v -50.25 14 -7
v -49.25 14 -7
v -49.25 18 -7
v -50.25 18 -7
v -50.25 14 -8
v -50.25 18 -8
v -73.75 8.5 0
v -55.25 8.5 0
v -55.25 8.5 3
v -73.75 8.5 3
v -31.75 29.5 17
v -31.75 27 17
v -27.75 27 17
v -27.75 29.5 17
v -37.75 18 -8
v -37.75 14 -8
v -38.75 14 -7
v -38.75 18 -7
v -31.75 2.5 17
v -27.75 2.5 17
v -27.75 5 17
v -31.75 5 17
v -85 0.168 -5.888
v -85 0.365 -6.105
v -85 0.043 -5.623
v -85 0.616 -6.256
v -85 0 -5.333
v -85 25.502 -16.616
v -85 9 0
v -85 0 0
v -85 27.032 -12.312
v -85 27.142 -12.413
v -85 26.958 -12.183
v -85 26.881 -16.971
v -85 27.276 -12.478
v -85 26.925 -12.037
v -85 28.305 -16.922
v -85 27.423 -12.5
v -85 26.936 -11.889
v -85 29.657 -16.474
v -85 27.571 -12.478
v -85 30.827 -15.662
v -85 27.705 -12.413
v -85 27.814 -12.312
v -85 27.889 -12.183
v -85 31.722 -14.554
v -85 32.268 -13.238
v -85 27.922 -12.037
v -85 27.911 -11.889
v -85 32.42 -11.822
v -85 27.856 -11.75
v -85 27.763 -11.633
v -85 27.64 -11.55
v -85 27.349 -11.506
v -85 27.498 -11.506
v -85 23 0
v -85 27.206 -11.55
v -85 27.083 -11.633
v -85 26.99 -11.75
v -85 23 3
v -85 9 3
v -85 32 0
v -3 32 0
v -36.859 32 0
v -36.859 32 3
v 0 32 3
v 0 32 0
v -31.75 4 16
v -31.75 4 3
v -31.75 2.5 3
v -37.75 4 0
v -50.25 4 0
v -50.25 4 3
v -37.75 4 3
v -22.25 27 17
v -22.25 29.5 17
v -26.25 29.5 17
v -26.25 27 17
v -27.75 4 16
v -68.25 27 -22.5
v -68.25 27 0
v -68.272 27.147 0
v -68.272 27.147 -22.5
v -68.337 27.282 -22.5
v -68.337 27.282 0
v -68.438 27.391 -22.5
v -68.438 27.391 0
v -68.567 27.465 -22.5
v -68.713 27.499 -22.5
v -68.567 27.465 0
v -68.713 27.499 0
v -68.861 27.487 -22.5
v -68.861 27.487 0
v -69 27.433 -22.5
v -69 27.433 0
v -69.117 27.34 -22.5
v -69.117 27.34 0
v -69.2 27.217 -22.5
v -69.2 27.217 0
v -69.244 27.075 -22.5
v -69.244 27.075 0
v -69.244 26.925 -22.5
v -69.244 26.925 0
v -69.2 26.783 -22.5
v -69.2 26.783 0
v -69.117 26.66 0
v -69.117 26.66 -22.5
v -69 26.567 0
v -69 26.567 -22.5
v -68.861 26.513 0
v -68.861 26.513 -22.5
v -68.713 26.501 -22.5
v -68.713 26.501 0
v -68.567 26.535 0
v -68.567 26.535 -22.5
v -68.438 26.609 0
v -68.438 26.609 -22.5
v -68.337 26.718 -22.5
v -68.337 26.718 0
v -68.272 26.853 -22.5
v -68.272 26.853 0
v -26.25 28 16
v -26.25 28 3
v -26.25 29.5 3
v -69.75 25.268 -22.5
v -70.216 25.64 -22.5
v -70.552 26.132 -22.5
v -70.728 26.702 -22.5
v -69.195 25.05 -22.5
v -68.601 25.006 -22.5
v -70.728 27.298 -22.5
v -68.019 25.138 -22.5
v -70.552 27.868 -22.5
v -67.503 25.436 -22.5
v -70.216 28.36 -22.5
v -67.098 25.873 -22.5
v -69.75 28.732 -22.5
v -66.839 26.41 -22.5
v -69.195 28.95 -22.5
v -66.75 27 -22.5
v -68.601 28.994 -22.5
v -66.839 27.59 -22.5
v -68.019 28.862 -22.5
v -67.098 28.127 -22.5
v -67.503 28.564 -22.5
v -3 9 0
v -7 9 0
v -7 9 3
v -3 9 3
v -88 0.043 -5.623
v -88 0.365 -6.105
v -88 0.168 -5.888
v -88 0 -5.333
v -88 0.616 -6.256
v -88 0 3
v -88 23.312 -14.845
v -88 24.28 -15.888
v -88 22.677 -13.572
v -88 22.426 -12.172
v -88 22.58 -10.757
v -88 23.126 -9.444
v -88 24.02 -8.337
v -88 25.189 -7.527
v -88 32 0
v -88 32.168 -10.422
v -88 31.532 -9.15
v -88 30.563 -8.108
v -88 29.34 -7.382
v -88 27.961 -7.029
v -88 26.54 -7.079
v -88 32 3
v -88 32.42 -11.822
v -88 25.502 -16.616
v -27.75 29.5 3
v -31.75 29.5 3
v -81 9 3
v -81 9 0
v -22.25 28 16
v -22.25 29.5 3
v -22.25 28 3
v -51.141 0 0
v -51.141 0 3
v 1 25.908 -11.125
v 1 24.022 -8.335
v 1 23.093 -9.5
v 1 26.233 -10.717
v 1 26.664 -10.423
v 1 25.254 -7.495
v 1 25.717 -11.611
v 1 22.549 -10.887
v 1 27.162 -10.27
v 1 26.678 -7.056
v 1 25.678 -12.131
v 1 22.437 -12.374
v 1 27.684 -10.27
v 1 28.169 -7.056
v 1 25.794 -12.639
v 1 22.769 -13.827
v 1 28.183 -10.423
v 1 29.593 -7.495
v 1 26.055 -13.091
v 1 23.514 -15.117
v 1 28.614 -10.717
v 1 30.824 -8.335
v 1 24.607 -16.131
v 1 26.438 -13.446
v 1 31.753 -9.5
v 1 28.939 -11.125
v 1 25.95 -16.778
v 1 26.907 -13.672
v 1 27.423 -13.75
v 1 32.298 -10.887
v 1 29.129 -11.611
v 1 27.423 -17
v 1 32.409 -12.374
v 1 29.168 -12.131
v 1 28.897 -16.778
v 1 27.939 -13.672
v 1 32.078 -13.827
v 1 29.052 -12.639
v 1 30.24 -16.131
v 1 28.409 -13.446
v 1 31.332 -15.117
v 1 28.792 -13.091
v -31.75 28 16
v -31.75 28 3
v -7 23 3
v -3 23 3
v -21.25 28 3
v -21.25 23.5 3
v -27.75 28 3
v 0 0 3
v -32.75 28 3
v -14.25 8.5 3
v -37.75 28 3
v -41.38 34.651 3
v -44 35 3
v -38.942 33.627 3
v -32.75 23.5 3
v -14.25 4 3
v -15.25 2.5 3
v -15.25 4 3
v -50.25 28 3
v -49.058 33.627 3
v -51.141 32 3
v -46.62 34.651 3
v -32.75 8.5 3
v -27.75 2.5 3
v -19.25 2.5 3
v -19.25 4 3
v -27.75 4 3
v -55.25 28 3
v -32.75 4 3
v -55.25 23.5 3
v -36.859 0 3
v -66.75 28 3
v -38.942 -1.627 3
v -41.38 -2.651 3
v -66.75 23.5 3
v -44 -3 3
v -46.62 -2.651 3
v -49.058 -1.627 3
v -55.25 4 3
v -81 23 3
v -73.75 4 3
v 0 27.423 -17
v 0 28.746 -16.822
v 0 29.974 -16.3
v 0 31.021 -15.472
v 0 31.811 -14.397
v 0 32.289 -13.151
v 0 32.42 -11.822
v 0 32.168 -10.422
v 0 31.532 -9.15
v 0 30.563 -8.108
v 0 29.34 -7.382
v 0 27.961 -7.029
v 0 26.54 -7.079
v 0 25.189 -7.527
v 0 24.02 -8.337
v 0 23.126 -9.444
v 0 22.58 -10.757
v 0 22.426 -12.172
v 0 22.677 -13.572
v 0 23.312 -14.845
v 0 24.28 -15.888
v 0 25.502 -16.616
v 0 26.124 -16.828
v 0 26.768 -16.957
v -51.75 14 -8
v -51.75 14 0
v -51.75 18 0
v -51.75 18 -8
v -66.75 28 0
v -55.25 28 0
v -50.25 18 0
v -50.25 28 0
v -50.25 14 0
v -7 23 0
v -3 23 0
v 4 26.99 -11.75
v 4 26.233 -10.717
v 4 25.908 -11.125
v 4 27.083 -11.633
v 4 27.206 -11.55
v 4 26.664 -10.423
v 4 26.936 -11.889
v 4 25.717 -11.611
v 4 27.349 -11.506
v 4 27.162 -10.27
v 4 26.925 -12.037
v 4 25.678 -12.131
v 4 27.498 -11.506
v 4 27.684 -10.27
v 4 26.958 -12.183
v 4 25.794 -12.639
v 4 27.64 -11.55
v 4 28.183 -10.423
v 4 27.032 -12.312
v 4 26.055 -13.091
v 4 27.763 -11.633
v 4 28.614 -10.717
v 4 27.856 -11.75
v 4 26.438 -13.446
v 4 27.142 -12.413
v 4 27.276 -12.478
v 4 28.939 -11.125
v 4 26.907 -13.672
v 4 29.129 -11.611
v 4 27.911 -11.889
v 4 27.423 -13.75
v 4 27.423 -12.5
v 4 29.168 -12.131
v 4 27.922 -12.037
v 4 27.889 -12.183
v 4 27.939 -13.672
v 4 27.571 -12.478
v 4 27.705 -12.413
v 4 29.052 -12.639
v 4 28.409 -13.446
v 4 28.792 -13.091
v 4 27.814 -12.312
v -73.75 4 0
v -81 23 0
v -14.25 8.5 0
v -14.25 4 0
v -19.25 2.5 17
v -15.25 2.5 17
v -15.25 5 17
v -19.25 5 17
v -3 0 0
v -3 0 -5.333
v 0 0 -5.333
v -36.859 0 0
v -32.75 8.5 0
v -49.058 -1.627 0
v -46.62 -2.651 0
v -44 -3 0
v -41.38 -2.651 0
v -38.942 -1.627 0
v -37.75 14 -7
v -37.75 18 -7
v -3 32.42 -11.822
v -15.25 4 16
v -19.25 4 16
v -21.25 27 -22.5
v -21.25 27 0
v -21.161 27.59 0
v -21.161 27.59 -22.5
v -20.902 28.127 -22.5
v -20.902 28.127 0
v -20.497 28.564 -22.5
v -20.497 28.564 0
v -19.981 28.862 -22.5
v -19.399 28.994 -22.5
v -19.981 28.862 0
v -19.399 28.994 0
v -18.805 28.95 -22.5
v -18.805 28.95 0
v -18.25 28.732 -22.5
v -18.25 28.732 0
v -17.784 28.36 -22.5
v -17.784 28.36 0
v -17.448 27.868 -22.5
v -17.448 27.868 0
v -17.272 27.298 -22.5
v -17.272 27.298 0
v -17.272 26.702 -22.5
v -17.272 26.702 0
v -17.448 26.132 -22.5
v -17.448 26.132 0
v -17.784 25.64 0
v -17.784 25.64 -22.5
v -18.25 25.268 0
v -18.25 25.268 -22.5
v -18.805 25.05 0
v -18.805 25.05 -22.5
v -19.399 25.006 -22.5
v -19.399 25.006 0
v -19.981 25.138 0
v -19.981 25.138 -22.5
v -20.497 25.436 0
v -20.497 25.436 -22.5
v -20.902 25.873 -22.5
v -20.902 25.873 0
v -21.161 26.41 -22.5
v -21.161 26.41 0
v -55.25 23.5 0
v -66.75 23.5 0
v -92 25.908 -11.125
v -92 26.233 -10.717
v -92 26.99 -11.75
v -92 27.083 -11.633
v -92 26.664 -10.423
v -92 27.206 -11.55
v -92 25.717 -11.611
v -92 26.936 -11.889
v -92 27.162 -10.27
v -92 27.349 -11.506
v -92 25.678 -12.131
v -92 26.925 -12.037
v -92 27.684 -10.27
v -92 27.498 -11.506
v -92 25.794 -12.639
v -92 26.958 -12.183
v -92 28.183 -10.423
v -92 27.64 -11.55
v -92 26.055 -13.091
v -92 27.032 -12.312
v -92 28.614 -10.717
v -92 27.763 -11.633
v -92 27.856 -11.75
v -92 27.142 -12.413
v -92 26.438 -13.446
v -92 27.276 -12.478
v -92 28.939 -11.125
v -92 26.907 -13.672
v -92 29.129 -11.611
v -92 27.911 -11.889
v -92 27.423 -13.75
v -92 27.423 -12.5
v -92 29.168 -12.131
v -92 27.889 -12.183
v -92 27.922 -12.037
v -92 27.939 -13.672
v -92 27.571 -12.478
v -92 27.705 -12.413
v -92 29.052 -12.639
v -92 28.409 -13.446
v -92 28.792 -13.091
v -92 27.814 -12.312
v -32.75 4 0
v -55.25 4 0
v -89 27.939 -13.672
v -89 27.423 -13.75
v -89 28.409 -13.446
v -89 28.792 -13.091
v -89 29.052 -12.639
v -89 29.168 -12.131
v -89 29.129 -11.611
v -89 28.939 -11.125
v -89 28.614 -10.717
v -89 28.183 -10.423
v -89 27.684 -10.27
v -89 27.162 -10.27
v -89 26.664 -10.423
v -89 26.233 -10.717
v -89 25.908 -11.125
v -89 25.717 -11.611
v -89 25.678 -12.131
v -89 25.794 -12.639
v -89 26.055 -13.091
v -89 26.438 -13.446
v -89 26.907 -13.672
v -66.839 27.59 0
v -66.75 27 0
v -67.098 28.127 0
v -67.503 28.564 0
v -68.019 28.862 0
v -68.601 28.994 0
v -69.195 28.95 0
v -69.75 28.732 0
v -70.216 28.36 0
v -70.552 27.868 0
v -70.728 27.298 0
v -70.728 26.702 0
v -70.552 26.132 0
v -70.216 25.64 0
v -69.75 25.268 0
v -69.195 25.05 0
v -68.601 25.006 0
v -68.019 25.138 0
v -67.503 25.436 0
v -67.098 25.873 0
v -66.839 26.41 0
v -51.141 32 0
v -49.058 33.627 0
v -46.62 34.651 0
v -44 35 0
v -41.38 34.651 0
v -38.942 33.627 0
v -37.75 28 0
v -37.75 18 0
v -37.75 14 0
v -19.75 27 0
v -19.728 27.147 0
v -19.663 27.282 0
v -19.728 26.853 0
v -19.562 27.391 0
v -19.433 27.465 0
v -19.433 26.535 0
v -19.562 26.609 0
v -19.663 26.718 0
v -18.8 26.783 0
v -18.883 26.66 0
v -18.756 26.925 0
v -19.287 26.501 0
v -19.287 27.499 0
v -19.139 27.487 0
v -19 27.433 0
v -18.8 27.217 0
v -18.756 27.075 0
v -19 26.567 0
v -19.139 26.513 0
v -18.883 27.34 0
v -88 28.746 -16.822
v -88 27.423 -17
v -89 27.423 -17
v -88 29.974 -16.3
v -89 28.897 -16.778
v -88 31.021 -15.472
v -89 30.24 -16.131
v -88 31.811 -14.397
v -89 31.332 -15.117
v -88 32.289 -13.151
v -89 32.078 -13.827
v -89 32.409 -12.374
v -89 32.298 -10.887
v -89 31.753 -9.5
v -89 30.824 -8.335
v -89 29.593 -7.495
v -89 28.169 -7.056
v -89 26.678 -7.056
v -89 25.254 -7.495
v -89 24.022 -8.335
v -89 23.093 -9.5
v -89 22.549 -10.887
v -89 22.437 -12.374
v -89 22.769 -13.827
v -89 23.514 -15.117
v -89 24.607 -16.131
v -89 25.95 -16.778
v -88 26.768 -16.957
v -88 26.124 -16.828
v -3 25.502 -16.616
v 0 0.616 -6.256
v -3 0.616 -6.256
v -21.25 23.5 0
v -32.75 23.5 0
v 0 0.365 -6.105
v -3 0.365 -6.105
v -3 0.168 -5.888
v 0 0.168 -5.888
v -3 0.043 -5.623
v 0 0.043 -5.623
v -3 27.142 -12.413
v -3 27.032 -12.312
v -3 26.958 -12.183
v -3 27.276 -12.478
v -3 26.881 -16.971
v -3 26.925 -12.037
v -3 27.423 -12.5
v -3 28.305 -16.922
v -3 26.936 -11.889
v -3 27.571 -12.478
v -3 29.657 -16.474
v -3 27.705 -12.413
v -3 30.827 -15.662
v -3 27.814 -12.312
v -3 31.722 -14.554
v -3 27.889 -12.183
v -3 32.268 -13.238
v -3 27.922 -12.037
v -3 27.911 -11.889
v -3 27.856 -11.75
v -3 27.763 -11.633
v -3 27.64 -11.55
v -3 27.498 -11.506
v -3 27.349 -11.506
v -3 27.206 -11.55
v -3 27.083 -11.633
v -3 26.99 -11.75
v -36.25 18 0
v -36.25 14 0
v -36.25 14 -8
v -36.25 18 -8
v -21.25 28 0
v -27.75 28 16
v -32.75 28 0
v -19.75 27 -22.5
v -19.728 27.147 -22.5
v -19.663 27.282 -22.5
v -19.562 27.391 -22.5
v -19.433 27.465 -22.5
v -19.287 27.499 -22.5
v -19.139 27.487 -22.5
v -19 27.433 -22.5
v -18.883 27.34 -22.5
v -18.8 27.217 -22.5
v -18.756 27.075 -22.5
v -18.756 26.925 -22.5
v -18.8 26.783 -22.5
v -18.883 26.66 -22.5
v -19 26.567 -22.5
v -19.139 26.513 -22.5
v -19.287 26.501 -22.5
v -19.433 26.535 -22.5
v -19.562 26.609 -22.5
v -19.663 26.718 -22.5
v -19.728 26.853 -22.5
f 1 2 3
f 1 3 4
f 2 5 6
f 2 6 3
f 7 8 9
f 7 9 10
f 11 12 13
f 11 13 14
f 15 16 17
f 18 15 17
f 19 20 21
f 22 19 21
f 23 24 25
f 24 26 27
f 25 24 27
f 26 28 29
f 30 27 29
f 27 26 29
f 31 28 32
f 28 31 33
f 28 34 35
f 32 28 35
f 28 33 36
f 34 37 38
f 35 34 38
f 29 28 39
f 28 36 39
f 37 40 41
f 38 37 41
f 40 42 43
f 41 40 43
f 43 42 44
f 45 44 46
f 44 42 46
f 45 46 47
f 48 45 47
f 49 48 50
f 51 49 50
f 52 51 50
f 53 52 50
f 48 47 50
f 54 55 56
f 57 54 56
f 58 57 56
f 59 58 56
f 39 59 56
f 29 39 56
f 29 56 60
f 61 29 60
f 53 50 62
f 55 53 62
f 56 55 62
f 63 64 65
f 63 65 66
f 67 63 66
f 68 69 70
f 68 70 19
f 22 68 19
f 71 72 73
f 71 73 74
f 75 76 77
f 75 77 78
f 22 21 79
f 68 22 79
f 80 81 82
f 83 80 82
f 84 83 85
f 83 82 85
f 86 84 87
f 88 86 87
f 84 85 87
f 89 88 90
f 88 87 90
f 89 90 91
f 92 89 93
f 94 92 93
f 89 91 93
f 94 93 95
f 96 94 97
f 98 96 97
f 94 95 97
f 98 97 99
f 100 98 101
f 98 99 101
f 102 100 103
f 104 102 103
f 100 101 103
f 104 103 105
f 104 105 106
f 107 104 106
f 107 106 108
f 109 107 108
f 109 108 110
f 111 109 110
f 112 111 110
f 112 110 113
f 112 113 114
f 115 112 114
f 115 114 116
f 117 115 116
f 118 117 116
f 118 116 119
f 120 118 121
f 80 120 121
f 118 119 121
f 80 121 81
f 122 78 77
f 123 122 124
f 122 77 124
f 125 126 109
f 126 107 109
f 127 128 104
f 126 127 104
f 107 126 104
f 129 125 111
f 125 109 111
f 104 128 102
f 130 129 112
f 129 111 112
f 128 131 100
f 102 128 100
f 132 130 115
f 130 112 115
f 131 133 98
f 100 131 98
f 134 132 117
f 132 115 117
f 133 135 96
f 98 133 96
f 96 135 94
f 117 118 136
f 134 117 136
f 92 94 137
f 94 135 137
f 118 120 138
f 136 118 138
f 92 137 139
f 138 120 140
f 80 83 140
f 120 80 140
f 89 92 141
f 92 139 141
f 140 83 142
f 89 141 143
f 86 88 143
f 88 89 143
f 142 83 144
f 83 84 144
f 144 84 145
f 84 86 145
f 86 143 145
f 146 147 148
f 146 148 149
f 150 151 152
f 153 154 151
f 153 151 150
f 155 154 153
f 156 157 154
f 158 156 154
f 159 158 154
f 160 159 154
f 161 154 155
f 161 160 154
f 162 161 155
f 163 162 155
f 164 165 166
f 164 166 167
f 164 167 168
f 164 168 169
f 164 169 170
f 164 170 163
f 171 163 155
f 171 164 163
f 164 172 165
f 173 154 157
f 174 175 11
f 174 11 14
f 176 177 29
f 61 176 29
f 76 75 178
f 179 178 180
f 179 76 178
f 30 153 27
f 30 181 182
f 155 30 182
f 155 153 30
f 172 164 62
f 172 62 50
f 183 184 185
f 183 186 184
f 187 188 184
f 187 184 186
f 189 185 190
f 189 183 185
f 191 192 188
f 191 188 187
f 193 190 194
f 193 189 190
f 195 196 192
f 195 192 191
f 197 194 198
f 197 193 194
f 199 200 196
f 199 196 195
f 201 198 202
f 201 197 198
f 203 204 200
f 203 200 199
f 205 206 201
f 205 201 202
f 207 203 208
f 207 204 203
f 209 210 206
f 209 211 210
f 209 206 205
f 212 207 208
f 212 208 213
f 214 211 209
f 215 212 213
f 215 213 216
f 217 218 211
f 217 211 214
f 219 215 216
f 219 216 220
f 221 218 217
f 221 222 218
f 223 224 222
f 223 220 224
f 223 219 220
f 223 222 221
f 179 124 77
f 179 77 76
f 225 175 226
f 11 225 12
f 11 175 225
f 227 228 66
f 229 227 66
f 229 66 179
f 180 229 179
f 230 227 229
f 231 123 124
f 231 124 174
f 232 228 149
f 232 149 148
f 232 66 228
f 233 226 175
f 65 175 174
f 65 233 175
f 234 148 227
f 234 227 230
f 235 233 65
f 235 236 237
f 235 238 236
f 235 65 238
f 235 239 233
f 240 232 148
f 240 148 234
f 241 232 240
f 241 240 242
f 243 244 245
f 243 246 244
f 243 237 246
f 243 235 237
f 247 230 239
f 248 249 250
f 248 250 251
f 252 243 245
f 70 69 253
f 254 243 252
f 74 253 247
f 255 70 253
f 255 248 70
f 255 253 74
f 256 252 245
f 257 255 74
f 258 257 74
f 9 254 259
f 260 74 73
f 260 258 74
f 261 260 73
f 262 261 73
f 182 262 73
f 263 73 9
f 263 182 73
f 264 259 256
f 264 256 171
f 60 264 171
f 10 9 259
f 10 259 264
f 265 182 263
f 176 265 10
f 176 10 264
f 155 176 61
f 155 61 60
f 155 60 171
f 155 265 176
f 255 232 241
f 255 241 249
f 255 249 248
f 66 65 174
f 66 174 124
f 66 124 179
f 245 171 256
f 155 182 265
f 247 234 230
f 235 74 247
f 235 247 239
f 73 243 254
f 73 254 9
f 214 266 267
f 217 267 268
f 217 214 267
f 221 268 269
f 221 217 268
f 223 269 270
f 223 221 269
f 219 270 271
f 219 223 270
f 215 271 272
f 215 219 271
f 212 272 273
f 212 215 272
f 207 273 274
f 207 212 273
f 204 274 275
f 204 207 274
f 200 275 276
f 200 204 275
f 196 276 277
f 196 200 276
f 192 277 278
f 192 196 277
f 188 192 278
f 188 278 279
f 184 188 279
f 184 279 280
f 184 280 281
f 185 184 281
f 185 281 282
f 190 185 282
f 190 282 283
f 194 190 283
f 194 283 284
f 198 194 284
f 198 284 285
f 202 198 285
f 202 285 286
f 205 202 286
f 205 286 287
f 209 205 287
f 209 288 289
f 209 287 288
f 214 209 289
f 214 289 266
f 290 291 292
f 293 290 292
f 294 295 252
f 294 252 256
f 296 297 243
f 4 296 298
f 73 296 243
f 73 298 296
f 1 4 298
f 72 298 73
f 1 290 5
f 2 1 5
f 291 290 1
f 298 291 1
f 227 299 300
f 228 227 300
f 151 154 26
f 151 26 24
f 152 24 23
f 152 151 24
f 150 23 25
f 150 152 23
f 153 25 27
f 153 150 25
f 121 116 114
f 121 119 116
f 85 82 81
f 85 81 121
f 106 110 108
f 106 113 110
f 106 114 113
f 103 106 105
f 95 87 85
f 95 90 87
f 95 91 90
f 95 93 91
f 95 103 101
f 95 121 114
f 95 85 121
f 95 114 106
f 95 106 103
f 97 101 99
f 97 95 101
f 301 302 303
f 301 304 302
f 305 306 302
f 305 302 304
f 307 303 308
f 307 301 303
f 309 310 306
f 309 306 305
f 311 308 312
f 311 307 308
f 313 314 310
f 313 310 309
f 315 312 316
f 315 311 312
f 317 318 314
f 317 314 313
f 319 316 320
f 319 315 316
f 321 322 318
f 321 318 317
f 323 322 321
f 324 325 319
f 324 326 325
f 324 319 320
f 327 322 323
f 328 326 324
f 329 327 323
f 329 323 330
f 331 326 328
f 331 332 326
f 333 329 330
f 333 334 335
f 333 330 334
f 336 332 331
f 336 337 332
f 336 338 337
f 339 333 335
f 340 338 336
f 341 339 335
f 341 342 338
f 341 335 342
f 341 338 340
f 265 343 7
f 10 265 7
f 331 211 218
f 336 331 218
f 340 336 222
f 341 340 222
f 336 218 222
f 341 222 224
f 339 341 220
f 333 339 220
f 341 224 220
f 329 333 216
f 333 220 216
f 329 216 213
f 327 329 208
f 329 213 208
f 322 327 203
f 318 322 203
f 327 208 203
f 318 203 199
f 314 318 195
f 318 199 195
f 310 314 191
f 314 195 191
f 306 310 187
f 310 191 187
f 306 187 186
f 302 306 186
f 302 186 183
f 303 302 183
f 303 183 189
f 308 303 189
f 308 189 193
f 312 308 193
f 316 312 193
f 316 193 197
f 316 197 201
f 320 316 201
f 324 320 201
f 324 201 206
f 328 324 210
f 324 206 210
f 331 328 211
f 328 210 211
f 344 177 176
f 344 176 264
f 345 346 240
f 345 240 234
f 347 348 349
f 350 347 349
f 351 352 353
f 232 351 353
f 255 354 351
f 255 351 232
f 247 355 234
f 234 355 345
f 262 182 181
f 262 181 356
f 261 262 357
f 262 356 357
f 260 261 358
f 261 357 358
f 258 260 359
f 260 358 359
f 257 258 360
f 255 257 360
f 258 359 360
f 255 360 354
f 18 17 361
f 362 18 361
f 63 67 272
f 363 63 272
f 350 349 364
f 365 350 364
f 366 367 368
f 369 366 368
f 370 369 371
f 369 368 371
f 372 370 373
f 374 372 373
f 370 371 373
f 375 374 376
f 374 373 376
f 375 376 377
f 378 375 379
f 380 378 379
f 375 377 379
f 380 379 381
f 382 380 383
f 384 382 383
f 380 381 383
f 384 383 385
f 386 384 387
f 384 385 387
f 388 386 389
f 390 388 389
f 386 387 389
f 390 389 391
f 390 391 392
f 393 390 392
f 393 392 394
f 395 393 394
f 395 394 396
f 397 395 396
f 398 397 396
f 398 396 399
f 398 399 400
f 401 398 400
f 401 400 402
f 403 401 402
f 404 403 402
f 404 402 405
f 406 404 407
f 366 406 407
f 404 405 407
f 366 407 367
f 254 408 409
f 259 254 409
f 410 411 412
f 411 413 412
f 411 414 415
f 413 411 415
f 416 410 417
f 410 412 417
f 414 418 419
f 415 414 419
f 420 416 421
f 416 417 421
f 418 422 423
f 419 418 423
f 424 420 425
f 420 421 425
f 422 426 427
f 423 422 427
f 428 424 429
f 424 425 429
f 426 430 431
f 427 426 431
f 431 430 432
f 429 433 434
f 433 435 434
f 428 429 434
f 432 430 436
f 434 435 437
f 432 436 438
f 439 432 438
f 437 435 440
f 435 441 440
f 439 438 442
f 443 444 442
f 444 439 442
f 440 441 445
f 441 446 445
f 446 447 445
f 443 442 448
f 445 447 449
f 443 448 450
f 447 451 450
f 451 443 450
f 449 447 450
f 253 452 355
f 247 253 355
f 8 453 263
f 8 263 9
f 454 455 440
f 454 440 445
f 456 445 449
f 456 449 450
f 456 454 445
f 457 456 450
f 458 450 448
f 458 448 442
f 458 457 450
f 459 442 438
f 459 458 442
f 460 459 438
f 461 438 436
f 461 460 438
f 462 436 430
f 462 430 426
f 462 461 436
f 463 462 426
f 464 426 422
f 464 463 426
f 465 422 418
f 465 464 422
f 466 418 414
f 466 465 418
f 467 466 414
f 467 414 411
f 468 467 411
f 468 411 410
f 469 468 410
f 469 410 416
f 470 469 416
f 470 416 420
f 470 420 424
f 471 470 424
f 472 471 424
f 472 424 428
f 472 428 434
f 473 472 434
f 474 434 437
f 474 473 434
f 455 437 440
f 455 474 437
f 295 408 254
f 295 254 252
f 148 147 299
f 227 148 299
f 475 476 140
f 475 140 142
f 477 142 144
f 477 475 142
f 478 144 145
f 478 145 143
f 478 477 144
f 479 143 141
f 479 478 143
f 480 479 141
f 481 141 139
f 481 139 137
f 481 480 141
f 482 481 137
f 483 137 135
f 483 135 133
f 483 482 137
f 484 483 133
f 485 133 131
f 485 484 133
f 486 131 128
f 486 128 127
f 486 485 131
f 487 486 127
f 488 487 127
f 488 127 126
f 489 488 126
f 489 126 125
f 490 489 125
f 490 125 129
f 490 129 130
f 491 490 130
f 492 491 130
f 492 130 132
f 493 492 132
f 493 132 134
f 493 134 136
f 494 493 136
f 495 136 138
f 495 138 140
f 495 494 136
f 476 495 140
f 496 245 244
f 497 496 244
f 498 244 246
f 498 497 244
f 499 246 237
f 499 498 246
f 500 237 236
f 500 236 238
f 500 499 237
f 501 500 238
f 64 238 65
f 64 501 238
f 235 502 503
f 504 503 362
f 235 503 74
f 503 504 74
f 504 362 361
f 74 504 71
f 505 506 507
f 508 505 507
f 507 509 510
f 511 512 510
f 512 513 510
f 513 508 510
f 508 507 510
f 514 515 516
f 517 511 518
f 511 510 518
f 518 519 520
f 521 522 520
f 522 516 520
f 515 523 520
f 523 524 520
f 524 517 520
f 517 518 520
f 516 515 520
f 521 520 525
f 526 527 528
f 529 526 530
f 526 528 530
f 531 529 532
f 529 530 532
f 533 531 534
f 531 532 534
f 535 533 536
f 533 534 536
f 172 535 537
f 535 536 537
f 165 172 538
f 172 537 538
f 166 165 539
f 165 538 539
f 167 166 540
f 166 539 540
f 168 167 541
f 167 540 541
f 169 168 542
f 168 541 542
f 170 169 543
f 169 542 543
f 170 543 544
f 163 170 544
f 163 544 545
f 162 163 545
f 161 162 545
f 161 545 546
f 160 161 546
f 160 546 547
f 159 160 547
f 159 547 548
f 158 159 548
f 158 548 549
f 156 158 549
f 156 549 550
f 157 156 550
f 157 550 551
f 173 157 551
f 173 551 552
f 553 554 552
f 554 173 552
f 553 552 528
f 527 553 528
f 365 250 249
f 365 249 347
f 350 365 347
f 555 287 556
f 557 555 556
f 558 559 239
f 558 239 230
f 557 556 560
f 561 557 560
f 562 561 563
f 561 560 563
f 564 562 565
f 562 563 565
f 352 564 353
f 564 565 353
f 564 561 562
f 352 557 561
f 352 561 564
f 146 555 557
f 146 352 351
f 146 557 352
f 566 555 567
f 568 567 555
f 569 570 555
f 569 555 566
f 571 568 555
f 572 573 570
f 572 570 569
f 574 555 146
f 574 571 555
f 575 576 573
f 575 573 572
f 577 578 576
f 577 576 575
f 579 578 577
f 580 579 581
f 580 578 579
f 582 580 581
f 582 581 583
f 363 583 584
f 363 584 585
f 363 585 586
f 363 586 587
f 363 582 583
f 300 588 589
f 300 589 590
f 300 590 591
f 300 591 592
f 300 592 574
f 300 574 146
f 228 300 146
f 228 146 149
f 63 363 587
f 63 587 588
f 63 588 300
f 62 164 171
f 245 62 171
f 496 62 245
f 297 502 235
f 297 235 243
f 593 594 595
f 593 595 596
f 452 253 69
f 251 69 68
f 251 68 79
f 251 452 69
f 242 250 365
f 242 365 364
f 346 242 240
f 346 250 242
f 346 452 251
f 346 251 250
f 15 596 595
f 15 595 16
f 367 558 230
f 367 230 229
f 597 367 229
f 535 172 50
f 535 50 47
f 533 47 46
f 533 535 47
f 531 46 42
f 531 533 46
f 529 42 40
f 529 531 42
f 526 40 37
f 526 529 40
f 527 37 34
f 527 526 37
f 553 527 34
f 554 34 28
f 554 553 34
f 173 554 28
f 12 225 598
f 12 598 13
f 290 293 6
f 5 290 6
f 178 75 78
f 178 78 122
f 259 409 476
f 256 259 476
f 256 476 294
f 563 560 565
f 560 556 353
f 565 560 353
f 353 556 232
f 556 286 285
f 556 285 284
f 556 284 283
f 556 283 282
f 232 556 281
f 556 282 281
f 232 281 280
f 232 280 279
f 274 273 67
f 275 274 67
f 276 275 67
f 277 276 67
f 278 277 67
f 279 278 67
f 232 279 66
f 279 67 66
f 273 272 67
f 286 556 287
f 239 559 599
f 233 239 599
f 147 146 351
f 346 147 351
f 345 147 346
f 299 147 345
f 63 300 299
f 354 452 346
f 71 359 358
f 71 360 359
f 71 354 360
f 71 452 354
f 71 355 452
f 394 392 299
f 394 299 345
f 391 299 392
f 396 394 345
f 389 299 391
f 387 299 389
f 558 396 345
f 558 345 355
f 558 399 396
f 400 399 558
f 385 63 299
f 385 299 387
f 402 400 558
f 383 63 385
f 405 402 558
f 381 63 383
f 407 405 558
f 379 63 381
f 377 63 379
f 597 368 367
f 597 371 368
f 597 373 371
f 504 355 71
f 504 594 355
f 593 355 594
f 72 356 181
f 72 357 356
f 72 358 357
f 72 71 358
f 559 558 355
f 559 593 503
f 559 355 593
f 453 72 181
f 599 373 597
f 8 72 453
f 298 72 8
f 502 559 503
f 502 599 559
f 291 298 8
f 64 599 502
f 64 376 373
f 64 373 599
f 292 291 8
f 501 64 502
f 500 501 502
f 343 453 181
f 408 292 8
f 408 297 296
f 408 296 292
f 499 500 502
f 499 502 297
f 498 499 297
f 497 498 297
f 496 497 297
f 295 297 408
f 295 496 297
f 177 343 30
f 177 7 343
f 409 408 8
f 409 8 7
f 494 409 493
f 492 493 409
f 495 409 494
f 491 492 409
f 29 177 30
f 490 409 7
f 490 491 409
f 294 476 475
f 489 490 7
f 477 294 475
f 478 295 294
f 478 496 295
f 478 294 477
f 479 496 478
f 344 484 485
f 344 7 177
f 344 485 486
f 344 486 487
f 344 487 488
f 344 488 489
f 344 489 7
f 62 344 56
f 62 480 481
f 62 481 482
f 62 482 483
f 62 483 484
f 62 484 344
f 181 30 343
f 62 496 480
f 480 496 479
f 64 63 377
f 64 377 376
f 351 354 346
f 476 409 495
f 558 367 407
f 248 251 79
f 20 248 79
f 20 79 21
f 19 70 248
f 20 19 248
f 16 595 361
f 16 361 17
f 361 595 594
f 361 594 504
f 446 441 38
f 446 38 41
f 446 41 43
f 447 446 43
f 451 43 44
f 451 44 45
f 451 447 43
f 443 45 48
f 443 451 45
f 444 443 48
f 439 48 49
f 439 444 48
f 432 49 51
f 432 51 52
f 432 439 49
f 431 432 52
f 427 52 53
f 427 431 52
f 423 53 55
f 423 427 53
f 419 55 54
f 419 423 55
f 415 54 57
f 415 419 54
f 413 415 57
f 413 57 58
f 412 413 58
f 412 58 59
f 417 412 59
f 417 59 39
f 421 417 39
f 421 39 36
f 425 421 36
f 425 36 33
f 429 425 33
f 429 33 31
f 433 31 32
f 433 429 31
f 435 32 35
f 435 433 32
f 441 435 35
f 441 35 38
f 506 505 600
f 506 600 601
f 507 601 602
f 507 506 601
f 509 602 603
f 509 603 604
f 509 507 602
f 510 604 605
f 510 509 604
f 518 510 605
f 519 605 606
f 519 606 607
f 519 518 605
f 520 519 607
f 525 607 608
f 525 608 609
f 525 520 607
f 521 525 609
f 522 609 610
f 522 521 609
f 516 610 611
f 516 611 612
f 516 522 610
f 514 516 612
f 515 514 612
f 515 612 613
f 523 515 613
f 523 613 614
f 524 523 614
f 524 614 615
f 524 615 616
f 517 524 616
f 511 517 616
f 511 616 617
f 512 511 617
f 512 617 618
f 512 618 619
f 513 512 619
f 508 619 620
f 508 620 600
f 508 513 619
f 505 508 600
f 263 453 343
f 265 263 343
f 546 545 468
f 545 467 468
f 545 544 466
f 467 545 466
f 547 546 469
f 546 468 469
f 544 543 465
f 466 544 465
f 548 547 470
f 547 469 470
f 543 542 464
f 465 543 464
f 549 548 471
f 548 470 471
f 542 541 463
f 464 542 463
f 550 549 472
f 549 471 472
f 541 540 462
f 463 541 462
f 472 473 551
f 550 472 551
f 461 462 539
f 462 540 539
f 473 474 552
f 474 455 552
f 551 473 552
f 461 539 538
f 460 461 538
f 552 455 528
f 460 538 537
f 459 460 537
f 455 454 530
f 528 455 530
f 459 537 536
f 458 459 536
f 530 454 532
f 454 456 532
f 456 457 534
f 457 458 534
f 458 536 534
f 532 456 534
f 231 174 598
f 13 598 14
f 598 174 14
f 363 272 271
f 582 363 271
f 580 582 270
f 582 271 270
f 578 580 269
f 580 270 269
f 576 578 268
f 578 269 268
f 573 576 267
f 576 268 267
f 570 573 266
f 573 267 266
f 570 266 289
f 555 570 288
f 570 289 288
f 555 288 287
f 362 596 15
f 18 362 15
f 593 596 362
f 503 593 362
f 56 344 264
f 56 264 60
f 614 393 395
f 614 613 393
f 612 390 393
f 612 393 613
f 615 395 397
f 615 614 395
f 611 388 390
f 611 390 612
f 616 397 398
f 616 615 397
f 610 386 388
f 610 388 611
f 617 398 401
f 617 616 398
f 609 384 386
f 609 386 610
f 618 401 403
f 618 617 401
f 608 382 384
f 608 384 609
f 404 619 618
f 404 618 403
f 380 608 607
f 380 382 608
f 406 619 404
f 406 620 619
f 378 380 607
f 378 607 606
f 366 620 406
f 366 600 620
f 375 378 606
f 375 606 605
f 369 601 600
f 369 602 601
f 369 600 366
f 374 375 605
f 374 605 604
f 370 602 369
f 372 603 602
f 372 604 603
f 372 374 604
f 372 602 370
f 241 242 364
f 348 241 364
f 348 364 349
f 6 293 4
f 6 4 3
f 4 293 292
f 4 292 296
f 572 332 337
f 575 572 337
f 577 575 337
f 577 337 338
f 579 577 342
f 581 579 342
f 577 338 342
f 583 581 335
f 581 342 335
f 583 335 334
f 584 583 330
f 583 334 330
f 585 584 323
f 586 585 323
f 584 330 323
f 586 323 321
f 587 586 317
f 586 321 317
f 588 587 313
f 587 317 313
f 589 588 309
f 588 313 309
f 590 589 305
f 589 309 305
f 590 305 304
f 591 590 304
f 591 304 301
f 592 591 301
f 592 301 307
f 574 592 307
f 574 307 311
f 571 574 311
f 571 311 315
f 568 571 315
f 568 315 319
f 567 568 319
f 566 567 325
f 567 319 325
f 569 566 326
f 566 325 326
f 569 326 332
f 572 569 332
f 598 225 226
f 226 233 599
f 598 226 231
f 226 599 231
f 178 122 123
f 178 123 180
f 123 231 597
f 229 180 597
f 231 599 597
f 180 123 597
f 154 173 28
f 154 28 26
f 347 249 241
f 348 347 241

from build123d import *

# Parameters (mm, degrees)
ESQUISSE1_W             = 11.5
ESQUISSE1_H             = 4.5
ESQUISSE1_W_2           = 18.5
ESQUISSE1_W_3           = 4
ESQUISSE1_H_2           = 14
BOSS_EXTRU_1_DEPTH      = 3
BOSS_EXTRU_2_DEPTH      = 3
ESQUISSE3_R             = 2
ESQUISSE3_R_2           = 0.5
BOSS_EXTRU_3_DEPTH      = 22.5
BOSS_EXTRU_4_START      = 1
ESQUISSE4_R             = 5
BOSS_EXTRU_4_DEPTH      = 1
ESQUISSE5_R             = 1.75
BOSS_EXTRU_5_DEPTH      = 3
ESQUISSE6_R             = 0.5
ENL_V_MAT_EXTRU_1_DEPTH = 7
ESQUISSE8_W             = 1.5
ESQUISSE8_H             = 4
BOSS_EXTRU_7_DEPTH      = 8
BOSS_EXTRU_8_DEPTH      = 4
BOSS_EXTRU_6_DEPTH      = 3
ESQUISSE10_W            = 4
ESQUISSE10_H            = 1.5
BOSS_EXTRU_9_DEPTH      = 14
BOSS_EXTRU_11_DEPTH     = 4
BOSS_EXTRU_12_DEPTH     = 4
BOSS_EXTRU_13_DEPTH     = 4
BOSS_EXTRU_14_DEPTH     = 4


with BuildPart() as part:
    # Esquisse1 → Boss.-Extru.1 (new body)
    with BuildSketch(Plane.XY):
        Polygon((-44, 32), (-44, 28), (-37.75, 28), (-37.75, 4), (-44, 4), (-44, 0), (0, 0), (0, 32), align=None)
        with Locations((-27, 25.75)):
            Rectangle(ESQUISSE1_W, ESQUISSE1_H, mode=Mode.SUBTRACT)
        with Locations((-23.5, 6.25)):
            Rectangle(ESQUISSE1_W_2, ESQUISSE1_H, mode=Mode.SUBTRACT)
        with Locations((-5, 16)):
            Rectangle(ESQUISSE1_W_3, ESQUISSE1_H_2, mode=Mode.SUBTRACT)
    boss_extru_1 = extrude(amount=BOSS_EXTRU_1_DEPTH)

    # Esquisse2 → Boss.-Extru.2 (add)
    with BuildSketch(Plane(origin=(0, 0, 0), x_dir=(0, 0, -1), z_dir=(1, 0, 0))):
        with BuildLine():
            Line((0, 32), (11.822414385, 32.42016324))
            ThreePointArc((11.822414385, 32.42016324), (16.109871823, 30.270940346), (16.616008757, 25.501739602))
            Line((16.616008757, 25.501739602), (6.256300568, 0.61568434))
            ThreePointArc((6.256300568, 0.61568434), (5.887934081, 0.168039767), (5.333098817, 0))
            Line((5.333098817, 0), (0, 0))
            Line((0, 0), (0, 32))
        make_face()
    boss_extru_2 = extrude(amount=-BOSS_EXTRU_2_DEPTH)

    # Esquisse3 → Boss.-Extru.3 (add)
    with BuildSketch(Plane(origin=(0, 0, 0), x_dir=(-1, 0, 0), z_dir=(0, 0, -1))):
        with Locations((19.25, 27)):
            Circle(ESQUISSE3_R)
        with Locations((19.25, 27)):
            Circle(ESQUISSE3_R_2, mode=Mode.SUBTRACT)
    boss_extru_3 = extrude(amount=BOSS_EXTRU_3_DEPTH)

    # Esquisse4 → Boss.-Extru.4 (add)
    with BuildSketch(Plane(origin=(0, 0, 0), x_dir=(0, 0, -1), z_dir=(1, 0, 0)).offset(BOSS_EXTRU_4_START)):
        with Locations((12, 27.4233179)):
            Circle(ESQUISSE4_R)
    boss_extru_4 = extrude(amount=-BOSS_EXTRU_4_DEPTH)

    # Esquisse5 → Boss.-Extru.5 (add)
    with BuildSketch(Plane(origin=(1, 0, 0), x_dir=(0, 0, -1), z_dir=(1, 0, 0))):
        with Locations((12, 27.4233179)):
            Circle(ESQUISSE5_R)
    boss_extru_5 = extrude(amount=BOSS_EXTRU_5_DEPTH)

    # Esquisse6 → Enlèv. mat.-Extru.1 (cut)
    with BuildSketch(Plane(origin=(4, 0, 0), x_dir=(0, 0, -1), z_dir=(1, 0, 0))):
        with Locations((12, 27.4233179)):
            Circle(ESQUISSE6_R)
    enl_v_mat_extru_1 = extrude(amount=-ENL_V_MAT_EXTRU_1_DEPTH, mode=Mode.SUBTRACT)

    # Esquisse8 → Boss.-Extru.7 (add)
    with BuildSketch(Plane(origin=(0, 0, 0), x_dir=(-1, 0, 0), z_dir=(0, 0, -1))):
        with Locations((37, 16)):
            Rectangle(ESQUISSE8_W, ESQUISSE8_H)
    boss_extru_7 = extrude(amount=BOSS_EXTRU_7_DEPTH)

    # Esquisse9 → Boss.-Extru.8 (add)
    with BuildSketch(Plane.XZ.offset(-14)):
        Polygon((-37.75, -8), (-38.75, -7), (-37.75, -7), align=None)
    boss_extru_8 = extrude(amount=-BOSS_EXTRU_8_DEPTH)

    # Symétrie1: Boss.-Extru.1, Boss.-Extru.2, Boss.-Extru.3, Boss.-Extru.4, Boss.-Extru.5, Enlèv. mat.-Extru.1, Boss.-Extru.7, Boss.-Extru.8 across plane
    add(boss_extru_1.mirror(Plane(origin=(-44, 32, 3), x_dir=(0, 0, 1), z_dir=(1, 0, 0))))
    add(boss_extru_2.mirror(Plane(origin=(-44, 32, 3), x_dir=(0, 0, 1), z_dir=(1, 0, 0))))
    add(boss_extru_3.mirror(Plane(origin=(-44, 32, 3), x_dir=(0, 0, 1), z_dir=(1, 0, 0))))
    add(boss_extru_4.mirror(Plane(origin=(-44, 32, 3), x_dir=(0, 0, 1), z_dir=(1, 0, 0))))
    add(boss_extru_5.mirror(Plane(origin=(-44, 32, 3), x_dir=(0, 0, 1), z_dir=(1, 0, 0))))
    add(enl_v_mat_extru_1.mirror(Plane(origin=(-44, 32, 3), x_dir=(0, 0, 1), z_dir=(1, 0, 0))), mode=Mode.SUBTRACT)
    add(boss_extru_7.mirror(Plane(origin=(-44, 32, 3), x_dir=(0, 0, 1), z_dir=(1, 0, 0))))
    add(boss_extru_8.mirror(Plane(origin=(-44, 32, 3), x_dir=(0, 0, 1), z_dir=(1, 0, 0))))

    # Esquisse7 → Boss.-Extru.6 (add)
    with BuildSketch(Plane(origin=(0, 0, 0), x_dir=(-1, 0, 0), z_dir=(0, 0, -1))):
        with BuildLine():
            Line((35.391133561, 30.087968026), (52.608866439, 30.087968026))
            ThreePointArc((52.608866439, 30.087968026), (44, 35), (35.391133561, 30.087968026))
        make_face()
    boss_extru_6 = extrude(amount=-BOSS_EXTRU_6_DEPTH)

    # Symétrie2: Boss.-Extru.6 across plane
    add(boss_extru_6.mirror(Plane(origin=(0, 16, 0), x_dir=(0, 0, 1), z_dir=(0, -1, 0))))

    # Esquisse10 → Boss.-Extru.9 (add)
    with BuildSketch(Plane.XY.offset(3)):
        with Locations((-29.75, 28.75)):
            Rectangle(ESQUISSE10_W, ESQUISSE10_H)
        with Locations((-24.25, 28.75)):
            Rectangle(ESQUISSE10_W, ESQUISSE10_H)
        with Locations((-29.75, 3.25)):
            Rectangle(ESQUISSE10_W, ESQUISSE10_H)
        with Locations((-17.25, 3.25)):
            Rectangle(ESQUISSE10_W, ESQUISSE10_H)
    extrude(amount=BOSS_EXTRU_9_DEPTH)

    # Esquisse11 → Boss.-Extru.11 (add)
    with BuildSketch(Plane(origin=(-15.25, 0, 0), x_dir=(0, 0, -1), z_dir=(1, 0, 0))):
        Polygon((-17, 4), (-17, 5), (-16, 4), align=None)
    extrude(amount=-BOSS_EXTRU_11_DEPTH)

    # Esquisse12 → Boss.-Extru.12 (add)
    with BuildSketch(Plane(origin=(-27.75, 0, 0), x_dir=(0, 0, -1), z_dir=(1, 0, 0))):
        Polygon((-17, 4), (-17, 5), (-16, 4), align=None)
    extrude(amount=-BOSS_EXTRU_12_DEPTH)

    # Esquisse13 → Boss.-Extru.13 (add)
    with BuildSketch(Plane(origin=(-22.25, 0, 0), x_dir=(0, 0, -1), z_dir=(1, 0, 0))):
        Polygon((-17, 28), (-17, 27), (-16, 28), align=None)
    extrude(amount=-BOSS_EXTRU_13_DEPTH)

    # Esquisse14 → Boss.-Extru.14 (add)
    with BuildSketch(Plane.ZY.offset(31.75)):
        Polygon((17, 28), (16, 28), (17, 27), align=None)
    extrude(amount=-BOSS_EXTRU_14_DEPTH)


solid = part.part
